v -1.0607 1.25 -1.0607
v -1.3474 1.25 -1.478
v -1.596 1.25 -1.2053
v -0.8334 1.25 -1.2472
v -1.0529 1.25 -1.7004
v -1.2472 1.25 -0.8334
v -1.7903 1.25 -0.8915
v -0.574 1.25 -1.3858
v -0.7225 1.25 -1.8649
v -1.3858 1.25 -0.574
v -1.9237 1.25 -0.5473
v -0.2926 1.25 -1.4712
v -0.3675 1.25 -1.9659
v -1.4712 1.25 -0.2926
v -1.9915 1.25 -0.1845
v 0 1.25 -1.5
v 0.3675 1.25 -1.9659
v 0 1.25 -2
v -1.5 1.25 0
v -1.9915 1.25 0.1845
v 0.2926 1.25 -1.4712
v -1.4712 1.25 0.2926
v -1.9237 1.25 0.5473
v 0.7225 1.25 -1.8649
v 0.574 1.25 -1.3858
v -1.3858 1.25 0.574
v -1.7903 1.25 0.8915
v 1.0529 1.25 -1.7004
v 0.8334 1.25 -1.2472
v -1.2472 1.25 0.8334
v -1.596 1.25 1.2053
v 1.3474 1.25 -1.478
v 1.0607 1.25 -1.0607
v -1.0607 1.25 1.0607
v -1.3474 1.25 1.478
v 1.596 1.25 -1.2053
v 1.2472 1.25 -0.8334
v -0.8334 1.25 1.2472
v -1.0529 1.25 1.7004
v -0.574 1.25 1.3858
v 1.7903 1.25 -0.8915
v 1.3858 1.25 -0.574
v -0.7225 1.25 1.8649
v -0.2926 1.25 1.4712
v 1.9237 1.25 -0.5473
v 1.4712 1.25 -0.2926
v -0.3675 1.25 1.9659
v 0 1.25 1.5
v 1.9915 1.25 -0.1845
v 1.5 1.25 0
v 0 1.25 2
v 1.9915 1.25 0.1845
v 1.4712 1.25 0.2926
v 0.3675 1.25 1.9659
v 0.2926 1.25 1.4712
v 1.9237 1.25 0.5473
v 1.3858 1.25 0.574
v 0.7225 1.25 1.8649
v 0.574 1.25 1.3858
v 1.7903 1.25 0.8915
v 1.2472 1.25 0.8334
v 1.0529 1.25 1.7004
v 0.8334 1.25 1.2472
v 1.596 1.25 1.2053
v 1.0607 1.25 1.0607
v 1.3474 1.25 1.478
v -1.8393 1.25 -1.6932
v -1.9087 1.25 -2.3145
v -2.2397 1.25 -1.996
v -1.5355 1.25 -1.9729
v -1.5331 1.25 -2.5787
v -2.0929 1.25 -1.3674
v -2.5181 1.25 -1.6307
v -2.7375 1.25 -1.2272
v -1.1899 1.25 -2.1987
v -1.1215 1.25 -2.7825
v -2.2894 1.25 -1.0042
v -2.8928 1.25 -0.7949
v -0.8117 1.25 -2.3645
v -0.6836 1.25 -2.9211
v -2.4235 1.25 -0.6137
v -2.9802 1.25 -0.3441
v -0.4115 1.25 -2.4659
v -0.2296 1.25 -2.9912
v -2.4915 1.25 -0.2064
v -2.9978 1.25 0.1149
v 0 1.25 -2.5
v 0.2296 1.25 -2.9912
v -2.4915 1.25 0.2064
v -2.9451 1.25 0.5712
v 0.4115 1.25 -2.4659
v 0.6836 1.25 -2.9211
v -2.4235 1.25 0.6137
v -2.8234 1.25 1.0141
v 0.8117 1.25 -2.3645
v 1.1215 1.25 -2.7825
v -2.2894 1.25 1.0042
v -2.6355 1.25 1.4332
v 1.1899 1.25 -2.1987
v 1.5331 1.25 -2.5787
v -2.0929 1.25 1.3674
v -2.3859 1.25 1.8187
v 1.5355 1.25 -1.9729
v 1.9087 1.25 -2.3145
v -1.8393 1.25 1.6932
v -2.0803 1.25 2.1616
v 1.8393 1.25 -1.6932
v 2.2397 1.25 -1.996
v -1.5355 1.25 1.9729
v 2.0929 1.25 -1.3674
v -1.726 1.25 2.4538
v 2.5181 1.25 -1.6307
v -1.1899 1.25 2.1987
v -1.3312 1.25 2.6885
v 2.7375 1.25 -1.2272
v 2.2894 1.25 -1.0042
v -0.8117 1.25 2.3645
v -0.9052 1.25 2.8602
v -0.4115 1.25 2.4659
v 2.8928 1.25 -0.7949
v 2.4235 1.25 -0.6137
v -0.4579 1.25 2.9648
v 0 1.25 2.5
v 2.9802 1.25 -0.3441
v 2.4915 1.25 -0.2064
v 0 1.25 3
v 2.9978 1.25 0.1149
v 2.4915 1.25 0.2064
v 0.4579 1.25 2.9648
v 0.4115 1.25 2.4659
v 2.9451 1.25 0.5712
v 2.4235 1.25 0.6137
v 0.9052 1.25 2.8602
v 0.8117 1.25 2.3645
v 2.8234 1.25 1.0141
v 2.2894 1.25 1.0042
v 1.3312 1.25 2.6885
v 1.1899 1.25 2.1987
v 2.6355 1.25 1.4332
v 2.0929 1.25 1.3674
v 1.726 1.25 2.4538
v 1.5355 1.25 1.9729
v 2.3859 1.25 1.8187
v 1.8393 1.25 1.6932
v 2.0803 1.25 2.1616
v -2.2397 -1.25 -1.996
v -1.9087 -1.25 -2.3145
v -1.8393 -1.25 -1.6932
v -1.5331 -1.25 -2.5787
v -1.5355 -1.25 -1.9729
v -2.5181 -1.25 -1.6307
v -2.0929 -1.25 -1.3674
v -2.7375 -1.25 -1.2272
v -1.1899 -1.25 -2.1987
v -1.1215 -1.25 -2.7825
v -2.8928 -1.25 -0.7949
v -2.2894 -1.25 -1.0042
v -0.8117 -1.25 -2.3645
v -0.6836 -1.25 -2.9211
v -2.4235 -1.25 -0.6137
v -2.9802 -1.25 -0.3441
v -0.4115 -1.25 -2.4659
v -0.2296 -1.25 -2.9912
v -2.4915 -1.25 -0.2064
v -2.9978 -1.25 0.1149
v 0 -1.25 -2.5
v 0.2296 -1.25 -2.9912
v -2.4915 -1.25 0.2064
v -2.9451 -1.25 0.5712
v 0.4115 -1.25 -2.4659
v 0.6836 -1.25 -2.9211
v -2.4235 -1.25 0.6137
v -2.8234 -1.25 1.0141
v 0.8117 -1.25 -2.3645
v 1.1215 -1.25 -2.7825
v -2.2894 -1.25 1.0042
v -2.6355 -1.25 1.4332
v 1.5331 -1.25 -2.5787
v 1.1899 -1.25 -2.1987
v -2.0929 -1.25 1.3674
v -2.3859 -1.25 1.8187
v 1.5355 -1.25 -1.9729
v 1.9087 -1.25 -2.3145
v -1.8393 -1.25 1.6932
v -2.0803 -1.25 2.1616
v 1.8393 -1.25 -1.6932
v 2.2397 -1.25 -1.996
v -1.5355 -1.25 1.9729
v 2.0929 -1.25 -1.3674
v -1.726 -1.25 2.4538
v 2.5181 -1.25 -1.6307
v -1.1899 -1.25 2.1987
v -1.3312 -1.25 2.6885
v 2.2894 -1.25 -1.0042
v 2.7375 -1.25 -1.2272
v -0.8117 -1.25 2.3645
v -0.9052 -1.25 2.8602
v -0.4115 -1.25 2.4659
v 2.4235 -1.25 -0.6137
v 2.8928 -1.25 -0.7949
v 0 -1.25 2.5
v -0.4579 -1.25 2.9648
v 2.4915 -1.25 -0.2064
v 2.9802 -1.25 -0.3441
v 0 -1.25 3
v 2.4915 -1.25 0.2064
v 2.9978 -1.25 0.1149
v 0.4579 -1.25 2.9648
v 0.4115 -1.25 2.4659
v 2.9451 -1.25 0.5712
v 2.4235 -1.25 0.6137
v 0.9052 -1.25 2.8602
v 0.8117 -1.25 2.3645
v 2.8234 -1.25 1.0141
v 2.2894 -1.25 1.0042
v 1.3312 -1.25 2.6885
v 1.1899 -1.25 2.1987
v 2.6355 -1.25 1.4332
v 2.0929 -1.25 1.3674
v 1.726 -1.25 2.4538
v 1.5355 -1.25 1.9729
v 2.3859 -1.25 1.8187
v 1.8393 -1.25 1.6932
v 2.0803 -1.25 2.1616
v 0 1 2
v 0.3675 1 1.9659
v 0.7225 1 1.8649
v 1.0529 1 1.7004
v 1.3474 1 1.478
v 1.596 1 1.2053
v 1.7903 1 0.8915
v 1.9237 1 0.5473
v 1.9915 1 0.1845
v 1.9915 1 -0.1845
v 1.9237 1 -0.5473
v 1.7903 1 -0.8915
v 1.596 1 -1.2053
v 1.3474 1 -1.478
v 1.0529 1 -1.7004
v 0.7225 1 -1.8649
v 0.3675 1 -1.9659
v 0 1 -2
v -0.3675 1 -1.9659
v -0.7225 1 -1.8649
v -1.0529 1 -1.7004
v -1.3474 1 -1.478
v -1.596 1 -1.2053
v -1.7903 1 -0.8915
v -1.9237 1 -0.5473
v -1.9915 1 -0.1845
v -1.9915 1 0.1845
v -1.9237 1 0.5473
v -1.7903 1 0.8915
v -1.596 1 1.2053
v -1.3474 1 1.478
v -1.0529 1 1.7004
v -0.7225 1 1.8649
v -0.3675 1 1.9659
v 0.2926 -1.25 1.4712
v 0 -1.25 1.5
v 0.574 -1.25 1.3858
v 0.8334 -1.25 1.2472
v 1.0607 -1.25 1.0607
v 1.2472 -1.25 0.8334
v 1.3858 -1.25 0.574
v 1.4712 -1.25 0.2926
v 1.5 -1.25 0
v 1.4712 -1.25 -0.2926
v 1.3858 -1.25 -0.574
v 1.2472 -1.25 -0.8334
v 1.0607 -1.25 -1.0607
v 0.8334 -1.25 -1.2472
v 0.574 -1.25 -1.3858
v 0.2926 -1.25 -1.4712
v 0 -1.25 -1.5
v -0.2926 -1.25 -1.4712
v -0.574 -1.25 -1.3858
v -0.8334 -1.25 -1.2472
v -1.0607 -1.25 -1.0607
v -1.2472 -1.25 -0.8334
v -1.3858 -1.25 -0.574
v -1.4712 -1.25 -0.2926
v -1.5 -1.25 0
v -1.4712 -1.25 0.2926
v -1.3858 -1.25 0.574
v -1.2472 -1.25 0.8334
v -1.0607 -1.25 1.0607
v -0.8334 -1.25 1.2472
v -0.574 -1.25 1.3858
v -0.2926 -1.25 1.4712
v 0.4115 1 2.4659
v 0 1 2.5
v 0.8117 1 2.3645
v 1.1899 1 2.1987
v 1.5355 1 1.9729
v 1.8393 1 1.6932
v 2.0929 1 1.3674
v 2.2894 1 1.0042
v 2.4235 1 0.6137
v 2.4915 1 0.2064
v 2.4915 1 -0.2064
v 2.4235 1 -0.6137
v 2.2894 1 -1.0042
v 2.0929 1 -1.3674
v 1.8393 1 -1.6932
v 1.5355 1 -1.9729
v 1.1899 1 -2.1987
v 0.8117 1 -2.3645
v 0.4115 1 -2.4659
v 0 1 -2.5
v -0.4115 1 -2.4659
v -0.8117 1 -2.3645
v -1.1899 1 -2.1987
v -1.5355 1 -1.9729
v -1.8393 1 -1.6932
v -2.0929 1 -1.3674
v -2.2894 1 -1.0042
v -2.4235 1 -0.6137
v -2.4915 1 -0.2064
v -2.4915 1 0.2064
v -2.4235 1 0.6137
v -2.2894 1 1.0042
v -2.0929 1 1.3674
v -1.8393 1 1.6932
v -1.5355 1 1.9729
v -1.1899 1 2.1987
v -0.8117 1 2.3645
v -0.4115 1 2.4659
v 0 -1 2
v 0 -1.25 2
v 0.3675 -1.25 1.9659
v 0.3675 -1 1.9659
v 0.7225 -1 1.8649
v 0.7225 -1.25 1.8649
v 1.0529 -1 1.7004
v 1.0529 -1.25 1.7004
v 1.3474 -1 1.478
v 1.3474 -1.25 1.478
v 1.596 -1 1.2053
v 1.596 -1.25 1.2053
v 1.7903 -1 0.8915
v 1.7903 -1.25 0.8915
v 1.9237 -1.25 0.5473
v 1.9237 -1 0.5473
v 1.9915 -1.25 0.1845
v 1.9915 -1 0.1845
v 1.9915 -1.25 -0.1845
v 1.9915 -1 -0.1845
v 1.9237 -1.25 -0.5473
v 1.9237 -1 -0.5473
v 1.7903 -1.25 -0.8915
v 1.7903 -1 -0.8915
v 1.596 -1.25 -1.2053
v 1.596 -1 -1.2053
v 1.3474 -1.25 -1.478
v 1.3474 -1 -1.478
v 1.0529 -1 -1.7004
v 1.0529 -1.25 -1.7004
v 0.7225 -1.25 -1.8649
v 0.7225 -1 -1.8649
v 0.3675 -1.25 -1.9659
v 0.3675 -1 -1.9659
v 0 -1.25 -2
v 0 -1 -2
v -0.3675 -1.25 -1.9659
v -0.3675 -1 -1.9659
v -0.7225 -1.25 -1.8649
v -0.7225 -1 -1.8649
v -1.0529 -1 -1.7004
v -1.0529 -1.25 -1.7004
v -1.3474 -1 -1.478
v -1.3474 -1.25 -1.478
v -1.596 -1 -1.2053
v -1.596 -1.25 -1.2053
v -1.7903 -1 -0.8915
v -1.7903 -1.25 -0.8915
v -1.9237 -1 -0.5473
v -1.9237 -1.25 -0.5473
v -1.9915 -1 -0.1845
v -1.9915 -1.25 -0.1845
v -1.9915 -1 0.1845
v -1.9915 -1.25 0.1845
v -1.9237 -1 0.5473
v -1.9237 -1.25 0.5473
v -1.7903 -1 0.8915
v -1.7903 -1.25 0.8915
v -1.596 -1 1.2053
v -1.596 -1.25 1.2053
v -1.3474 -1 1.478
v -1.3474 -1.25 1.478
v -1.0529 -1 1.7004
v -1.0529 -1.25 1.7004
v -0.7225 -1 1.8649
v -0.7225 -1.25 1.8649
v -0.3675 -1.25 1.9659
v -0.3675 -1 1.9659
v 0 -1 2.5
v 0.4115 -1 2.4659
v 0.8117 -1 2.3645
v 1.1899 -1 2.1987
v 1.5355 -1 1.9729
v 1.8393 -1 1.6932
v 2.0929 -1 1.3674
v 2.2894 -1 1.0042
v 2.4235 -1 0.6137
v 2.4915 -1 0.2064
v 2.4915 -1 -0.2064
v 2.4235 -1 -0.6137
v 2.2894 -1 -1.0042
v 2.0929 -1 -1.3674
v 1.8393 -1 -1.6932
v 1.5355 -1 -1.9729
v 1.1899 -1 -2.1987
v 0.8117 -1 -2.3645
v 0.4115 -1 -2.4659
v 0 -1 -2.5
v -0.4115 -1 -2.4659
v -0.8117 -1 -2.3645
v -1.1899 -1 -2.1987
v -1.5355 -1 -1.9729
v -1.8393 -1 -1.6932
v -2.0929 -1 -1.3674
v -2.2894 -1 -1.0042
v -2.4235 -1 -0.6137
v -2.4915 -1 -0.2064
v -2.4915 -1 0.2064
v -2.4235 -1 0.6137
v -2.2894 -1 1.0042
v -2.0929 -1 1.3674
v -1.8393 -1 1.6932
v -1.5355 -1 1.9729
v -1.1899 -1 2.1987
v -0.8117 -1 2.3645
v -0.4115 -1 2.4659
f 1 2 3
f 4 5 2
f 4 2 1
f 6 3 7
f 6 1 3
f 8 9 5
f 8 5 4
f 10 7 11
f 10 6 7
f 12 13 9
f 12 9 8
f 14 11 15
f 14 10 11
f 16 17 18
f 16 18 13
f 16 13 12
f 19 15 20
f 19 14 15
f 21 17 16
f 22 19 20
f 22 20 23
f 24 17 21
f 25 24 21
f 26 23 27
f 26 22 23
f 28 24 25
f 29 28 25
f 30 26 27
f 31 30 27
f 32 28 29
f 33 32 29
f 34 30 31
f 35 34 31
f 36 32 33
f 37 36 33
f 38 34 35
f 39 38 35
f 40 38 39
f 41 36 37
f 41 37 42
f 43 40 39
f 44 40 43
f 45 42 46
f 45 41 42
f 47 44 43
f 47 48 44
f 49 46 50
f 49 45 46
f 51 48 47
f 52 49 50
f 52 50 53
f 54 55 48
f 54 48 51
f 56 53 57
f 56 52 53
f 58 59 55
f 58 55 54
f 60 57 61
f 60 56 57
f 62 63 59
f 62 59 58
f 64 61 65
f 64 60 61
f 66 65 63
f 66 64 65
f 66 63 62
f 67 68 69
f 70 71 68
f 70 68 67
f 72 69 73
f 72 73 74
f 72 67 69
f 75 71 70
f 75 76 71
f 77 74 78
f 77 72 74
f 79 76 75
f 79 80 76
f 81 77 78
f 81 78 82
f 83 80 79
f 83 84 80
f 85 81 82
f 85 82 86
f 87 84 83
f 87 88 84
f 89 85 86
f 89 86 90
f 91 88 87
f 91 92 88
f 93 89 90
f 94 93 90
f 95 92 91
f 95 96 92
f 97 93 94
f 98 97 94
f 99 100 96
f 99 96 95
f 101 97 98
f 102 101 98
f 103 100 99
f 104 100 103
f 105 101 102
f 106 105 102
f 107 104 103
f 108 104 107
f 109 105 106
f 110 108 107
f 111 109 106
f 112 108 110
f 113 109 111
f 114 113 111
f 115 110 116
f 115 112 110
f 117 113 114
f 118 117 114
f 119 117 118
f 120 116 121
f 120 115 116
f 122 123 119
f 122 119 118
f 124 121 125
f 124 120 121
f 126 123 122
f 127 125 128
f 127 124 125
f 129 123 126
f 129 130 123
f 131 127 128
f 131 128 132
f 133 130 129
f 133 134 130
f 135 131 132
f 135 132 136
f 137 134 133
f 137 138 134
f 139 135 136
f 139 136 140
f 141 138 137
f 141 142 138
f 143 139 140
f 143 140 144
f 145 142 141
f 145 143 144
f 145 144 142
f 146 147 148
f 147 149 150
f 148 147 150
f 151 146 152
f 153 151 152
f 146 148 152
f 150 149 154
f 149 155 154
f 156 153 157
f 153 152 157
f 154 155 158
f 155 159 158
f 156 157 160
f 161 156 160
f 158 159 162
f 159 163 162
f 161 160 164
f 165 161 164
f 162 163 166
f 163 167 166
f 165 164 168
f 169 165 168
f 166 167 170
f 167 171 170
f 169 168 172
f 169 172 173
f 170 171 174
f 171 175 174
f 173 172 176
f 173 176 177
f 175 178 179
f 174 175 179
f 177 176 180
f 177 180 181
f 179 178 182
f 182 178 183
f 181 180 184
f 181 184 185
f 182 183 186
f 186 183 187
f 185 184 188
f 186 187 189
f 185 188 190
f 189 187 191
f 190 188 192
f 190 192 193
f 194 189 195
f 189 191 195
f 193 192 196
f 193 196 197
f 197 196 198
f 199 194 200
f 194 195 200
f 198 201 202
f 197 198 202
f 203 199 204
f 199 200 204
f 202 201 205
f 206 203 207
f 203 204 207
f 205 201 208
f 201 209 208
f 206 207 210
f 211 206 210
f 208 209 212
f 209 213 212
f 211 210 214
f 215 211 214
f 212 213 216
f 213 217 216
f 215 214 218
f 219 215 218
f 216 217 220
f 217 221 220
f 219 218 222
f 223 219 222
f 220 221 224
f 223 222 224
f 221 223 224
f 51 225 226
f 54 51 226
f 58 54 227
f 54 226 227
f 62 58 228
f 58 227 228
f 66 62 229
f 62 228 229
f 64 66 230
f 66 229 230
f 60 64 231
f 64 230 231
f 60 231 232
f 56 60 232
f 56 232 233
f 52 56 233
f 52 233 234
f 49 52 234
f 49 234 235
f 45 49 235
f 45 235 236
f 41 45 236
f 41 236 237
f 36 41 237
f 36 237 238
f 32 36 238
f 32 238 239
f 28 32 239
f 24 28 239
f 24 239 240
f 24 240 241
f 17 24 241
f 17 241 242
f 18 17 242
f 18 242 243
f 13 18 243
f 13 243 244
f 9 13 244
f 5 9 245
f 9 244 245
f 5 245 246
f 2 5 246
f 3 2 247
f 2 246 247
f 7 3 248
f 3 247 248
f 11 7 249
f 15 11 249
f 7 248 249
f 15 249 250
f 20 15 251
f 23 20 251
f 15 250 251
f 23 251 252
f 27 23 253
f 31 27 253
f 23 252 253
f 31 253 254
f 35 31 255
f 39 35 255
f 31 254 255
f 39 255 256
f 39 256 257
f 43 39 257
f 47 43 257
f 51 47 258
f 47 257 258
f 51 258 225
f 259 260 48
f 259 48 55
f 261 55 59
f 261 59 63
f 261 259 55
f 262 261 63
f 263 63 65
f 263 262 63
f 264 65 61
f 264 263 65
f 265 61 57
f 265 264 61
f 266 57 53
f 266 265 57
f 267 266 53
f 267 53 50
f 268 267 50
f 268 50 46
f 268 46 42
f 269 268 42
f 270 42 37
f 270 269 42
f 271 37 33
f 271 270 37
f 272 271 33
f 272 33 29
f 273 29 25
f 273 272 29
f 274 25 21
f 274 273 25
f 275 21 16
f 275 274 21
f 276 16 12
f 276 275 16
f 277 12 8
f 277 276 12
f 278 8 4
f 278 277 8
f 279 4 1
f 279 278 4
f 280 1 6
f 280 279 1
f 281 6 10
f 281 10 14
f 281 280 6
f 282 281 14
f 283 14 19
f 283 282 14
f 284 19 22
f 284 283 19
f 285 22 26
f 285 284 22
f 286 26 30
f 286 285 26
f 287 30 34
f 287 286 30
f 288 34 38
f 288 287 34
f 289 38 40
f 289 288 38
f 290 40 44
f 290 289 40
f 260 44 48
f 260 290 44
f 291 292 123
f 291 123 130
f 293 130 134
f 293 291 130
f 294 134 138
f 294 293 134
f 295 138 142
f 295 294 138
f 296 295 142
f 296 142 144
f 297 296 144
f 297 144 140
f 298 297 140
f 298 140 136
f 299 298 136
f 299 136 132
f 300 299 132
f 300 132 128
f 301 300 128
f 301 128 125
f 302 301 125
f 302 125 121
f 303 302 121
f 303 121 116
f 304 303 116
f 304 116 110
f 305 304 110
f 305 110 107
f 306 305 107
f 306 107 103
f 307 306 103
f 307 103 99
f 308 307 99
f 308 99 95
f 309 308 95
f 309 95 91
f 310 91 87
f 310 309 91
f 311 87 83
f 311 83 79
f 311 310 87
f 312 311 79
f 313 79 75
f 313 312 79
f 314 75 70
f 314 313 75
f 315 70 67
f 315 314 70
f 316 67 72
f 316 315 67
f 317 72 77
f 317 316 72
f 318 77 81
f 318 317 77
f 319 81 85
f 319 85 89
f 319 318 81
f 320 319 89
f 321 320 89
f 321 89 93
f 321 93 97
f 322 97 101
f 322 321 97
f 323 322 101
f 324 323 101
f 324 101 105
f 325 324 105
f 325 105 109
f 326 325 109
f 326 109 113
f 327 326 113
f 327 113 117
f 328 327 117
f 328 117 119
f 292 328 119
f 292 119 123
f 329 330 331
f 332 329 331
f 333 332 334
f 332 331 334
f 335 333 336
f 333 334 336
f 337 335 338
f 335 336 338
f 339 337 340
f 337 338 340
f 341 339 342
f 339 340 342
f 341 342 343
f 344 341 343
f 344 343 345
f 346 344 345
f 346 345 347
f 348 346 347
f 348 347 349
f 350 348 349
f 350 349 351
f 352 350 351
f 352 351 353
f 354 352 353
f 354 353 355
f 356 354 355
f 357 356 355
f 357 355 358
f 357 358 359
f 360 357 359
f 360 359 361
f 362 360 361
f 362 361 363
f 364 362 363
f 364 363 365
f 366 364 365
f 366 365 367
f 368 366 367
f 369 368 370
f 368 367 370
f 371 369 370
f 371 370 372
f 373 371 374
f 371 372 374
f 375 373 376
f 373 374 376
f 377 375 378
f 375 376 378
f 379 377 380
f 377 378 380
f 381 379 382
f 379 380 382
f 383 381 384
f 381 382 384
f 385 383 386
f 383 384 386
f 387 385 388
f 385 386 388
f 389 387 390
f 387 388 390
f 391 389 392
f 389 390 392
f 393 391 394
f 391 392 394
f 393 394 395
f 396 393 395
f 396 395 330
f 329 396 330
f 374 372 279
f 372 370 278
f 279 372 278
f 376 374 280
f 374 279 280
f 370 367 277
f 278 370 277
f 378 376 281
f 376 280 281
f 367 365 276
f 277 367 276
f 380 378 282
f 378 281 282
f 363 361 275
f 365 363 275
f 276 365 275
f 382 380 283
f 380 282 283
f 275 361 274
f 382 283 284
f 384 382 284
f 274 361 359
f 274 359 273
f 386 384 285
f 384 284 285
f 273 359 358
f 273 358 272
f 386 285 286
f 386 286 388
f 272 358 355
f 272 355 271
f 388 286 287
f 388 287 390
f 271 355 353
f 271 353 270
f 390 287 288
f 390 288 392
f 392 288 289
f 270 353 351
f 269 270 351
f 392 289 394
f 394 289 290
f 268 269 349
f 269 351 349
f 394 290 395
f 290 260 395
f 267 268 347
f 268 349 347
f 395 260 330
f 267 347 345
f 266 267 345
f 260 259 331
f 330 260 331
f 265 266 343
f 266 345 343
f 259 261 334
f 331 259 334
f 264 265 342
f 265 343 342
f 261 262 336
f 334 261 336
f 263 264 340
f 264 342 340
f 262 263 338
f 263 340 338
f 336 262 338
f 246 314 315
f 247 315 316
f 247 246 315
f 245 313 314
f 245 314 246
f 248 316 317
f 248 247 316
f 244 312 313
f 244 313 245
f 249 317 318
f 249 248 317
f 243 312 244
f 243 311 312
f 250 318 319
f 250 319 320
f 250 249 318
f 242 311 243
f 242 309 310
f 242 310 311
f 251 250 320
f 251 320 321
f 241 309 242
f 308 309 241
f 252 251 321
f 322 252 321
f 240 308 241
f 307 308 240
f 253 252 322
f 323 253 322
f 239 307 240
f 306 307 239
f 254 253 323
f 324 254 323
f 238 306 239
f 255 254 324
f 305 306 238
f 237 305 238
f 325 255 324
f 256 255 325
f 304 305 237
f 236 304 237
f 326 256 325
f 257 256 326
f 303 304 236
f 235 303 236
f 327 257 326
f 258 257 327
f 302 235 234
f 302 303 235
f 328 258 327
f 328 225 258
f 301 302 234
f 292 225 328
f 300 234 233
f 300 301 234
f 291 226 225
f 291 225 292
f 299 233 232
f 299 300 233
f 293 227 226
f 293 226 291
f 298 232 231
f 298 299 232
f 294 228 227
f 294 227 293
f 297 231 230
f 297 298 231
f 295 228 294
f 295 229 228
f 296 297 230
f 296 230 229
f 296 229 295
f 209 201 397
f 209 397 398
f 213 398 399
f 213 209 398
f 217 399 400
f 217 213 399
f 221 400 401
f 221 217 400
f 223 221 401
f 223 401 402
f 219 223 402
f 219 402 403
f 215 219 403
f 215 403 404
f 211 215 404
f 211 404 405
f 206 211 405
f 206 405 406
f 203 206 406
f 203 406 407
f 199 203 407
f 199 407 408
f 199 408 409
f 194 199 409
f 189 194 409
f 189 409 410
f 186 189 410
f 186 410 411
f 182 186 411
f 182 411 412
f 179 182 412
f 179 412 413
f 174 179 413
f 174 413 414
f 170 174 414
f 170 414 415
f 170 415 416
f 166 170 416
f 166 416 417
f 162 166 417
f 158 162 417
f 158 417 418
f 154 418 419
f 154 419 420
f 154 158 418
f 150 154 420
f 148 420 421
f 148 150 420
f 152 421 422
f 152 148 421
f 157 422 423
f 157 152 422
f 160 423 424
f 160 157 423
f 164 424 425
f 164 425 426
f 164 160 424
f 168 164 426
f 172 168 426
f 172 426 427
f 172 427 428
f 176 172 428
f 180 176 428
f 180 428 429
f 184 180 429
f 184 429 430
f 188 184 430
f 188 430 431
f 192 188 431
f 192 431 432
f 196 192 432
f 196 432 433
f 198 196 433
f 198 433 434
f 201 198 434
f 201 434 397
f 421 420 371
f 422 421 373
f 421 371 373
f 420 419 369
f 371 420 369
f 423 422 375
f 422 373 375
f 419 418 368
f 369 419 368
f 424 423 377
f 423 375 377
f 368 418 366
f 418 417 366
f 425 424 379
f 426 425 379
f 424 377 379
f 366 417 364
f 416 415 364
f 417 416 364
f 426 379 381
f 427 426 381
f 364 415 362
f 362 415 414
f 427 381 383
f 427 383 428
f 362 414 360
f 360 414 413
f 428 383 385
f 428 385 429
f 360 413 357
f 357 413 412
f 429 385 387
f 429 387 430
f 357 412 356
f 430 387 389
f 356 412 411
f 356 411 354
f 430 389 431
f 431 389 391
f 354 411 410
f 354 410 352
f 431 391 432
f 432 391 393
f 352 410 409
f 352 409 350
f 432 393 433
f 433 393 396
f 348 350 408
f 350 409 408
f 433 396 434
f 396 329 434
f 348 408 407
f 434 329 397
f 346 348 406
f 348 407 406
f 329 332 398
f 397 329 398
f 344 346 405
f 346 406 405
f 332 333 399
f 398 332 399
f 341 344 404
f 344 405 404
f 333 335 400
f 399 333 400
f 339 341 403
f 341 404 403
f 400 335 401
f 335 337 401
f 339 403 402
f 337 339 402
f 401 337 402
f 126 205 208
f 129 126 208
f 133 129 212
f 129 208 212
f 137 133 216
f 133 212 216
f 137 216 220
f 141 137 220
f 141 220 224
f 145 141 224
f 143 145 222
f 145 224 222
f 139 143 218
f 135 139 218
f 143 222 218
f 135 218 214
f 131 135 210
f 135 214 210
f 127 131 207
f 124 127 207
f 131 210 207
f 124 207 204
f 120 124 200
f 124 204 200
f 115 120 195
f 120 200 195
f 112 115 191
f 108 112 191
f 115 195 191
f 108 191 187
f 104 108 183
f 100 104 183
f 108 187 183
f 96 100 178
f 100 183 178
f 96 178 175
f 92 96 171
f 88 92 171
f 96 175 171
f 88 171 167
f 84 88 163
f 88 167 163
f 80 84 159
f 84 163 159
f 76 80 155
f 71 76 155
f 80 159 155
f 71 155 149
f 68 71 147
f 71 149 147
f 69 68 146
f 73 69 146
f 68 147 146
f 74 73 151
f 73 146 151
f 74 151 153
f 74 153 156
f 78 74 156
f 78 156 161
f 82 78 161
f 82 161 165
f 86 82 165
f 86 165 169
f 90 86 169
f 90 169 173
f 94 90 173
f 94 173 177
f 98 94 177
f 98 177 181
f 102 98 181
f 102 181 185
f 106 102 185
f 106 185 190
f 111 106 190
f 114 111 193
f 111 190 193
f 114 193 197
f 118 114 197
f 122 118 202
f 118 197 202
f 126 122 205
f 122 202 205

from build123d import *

# Parameters (mm, degrees)
EXTRUDE_1_DEPTH      = 1.25
EXTRUDE_1_DEPTH_BACK = 1.25
SKETCH_1_R           = 2
SKETCH_1_R_2         = 1.5
EXTRUDE_2_DEPTH      = 1
EXTRUDE_2_DEPTH_BACK = 1
SKETCH_2_R           = 2.5
SKETCH_2_R_2         = 2
EXTRUDE_3_DEPTH      = 1.25
EXTRUDE_3_DEPTH_BACK = 1.25
SKETCH_3_R           = 3
SKETCH_3_R_2         = 2.5


with BuildPart() as part:
    # 草图1 → 凸台-拉伸1 (new, two sides: drawn at the far end of the back side and taken through both)
    with BuildSketch(Plane(origin=(0, 0, 0), x_dir=(1, 0, 0), z_dir=(0, 1, 0)).offset(-EXTRUDE_1_DEPTH_BACK)):
        Circle(SKETCH_1_R)
        Circle(SKETCH_1_R_2, mode=Mode.SUBTRACT)
    extrude(amount=EXTRUDE_1_DEPTH + EXTRUDE_1_DEPTH_BACK)

    # 草图2 → 凸台-拉伸2 (add, two sides: drawn at the far end of the back side and taken through both)
    with BuildSketch(Plane(origin=(0, 0, 0), x_dir=(1, 0, 0), z_dir=(0, 1, 0)).offset(-EXTRUDE_2_DEPTH_BACK)):
        Circle(SKETCH_2_R)
        Circle(SKETCH_2_R_2, mode=Mode.SUBTRACT)
    extrude(amount=EXTRUDE_2_DEPTH + EXTRUDE_2_DEPTH_BACK)

    # 草图3 → 凸台-拉伸3 (add, two sides: drawn at the far end of the back side and taken through both)
    with BuildSketch(Plane(origin=(0, 0, 0), x_dir=(1, 0, 0), z_dir=(0, 1, 0)).offset(-EXTRUDE_3_DEPTH_BACK)):
        Circle(SKETCH_3_R)
        Circle(SKETCH_3_R_2, mode=Mode.SUBTRACT)
    extrude(amount=EXTRUDE_3_DEPTH + EXTRUDE_3_DEPTH_BACK)


solid = part.part
